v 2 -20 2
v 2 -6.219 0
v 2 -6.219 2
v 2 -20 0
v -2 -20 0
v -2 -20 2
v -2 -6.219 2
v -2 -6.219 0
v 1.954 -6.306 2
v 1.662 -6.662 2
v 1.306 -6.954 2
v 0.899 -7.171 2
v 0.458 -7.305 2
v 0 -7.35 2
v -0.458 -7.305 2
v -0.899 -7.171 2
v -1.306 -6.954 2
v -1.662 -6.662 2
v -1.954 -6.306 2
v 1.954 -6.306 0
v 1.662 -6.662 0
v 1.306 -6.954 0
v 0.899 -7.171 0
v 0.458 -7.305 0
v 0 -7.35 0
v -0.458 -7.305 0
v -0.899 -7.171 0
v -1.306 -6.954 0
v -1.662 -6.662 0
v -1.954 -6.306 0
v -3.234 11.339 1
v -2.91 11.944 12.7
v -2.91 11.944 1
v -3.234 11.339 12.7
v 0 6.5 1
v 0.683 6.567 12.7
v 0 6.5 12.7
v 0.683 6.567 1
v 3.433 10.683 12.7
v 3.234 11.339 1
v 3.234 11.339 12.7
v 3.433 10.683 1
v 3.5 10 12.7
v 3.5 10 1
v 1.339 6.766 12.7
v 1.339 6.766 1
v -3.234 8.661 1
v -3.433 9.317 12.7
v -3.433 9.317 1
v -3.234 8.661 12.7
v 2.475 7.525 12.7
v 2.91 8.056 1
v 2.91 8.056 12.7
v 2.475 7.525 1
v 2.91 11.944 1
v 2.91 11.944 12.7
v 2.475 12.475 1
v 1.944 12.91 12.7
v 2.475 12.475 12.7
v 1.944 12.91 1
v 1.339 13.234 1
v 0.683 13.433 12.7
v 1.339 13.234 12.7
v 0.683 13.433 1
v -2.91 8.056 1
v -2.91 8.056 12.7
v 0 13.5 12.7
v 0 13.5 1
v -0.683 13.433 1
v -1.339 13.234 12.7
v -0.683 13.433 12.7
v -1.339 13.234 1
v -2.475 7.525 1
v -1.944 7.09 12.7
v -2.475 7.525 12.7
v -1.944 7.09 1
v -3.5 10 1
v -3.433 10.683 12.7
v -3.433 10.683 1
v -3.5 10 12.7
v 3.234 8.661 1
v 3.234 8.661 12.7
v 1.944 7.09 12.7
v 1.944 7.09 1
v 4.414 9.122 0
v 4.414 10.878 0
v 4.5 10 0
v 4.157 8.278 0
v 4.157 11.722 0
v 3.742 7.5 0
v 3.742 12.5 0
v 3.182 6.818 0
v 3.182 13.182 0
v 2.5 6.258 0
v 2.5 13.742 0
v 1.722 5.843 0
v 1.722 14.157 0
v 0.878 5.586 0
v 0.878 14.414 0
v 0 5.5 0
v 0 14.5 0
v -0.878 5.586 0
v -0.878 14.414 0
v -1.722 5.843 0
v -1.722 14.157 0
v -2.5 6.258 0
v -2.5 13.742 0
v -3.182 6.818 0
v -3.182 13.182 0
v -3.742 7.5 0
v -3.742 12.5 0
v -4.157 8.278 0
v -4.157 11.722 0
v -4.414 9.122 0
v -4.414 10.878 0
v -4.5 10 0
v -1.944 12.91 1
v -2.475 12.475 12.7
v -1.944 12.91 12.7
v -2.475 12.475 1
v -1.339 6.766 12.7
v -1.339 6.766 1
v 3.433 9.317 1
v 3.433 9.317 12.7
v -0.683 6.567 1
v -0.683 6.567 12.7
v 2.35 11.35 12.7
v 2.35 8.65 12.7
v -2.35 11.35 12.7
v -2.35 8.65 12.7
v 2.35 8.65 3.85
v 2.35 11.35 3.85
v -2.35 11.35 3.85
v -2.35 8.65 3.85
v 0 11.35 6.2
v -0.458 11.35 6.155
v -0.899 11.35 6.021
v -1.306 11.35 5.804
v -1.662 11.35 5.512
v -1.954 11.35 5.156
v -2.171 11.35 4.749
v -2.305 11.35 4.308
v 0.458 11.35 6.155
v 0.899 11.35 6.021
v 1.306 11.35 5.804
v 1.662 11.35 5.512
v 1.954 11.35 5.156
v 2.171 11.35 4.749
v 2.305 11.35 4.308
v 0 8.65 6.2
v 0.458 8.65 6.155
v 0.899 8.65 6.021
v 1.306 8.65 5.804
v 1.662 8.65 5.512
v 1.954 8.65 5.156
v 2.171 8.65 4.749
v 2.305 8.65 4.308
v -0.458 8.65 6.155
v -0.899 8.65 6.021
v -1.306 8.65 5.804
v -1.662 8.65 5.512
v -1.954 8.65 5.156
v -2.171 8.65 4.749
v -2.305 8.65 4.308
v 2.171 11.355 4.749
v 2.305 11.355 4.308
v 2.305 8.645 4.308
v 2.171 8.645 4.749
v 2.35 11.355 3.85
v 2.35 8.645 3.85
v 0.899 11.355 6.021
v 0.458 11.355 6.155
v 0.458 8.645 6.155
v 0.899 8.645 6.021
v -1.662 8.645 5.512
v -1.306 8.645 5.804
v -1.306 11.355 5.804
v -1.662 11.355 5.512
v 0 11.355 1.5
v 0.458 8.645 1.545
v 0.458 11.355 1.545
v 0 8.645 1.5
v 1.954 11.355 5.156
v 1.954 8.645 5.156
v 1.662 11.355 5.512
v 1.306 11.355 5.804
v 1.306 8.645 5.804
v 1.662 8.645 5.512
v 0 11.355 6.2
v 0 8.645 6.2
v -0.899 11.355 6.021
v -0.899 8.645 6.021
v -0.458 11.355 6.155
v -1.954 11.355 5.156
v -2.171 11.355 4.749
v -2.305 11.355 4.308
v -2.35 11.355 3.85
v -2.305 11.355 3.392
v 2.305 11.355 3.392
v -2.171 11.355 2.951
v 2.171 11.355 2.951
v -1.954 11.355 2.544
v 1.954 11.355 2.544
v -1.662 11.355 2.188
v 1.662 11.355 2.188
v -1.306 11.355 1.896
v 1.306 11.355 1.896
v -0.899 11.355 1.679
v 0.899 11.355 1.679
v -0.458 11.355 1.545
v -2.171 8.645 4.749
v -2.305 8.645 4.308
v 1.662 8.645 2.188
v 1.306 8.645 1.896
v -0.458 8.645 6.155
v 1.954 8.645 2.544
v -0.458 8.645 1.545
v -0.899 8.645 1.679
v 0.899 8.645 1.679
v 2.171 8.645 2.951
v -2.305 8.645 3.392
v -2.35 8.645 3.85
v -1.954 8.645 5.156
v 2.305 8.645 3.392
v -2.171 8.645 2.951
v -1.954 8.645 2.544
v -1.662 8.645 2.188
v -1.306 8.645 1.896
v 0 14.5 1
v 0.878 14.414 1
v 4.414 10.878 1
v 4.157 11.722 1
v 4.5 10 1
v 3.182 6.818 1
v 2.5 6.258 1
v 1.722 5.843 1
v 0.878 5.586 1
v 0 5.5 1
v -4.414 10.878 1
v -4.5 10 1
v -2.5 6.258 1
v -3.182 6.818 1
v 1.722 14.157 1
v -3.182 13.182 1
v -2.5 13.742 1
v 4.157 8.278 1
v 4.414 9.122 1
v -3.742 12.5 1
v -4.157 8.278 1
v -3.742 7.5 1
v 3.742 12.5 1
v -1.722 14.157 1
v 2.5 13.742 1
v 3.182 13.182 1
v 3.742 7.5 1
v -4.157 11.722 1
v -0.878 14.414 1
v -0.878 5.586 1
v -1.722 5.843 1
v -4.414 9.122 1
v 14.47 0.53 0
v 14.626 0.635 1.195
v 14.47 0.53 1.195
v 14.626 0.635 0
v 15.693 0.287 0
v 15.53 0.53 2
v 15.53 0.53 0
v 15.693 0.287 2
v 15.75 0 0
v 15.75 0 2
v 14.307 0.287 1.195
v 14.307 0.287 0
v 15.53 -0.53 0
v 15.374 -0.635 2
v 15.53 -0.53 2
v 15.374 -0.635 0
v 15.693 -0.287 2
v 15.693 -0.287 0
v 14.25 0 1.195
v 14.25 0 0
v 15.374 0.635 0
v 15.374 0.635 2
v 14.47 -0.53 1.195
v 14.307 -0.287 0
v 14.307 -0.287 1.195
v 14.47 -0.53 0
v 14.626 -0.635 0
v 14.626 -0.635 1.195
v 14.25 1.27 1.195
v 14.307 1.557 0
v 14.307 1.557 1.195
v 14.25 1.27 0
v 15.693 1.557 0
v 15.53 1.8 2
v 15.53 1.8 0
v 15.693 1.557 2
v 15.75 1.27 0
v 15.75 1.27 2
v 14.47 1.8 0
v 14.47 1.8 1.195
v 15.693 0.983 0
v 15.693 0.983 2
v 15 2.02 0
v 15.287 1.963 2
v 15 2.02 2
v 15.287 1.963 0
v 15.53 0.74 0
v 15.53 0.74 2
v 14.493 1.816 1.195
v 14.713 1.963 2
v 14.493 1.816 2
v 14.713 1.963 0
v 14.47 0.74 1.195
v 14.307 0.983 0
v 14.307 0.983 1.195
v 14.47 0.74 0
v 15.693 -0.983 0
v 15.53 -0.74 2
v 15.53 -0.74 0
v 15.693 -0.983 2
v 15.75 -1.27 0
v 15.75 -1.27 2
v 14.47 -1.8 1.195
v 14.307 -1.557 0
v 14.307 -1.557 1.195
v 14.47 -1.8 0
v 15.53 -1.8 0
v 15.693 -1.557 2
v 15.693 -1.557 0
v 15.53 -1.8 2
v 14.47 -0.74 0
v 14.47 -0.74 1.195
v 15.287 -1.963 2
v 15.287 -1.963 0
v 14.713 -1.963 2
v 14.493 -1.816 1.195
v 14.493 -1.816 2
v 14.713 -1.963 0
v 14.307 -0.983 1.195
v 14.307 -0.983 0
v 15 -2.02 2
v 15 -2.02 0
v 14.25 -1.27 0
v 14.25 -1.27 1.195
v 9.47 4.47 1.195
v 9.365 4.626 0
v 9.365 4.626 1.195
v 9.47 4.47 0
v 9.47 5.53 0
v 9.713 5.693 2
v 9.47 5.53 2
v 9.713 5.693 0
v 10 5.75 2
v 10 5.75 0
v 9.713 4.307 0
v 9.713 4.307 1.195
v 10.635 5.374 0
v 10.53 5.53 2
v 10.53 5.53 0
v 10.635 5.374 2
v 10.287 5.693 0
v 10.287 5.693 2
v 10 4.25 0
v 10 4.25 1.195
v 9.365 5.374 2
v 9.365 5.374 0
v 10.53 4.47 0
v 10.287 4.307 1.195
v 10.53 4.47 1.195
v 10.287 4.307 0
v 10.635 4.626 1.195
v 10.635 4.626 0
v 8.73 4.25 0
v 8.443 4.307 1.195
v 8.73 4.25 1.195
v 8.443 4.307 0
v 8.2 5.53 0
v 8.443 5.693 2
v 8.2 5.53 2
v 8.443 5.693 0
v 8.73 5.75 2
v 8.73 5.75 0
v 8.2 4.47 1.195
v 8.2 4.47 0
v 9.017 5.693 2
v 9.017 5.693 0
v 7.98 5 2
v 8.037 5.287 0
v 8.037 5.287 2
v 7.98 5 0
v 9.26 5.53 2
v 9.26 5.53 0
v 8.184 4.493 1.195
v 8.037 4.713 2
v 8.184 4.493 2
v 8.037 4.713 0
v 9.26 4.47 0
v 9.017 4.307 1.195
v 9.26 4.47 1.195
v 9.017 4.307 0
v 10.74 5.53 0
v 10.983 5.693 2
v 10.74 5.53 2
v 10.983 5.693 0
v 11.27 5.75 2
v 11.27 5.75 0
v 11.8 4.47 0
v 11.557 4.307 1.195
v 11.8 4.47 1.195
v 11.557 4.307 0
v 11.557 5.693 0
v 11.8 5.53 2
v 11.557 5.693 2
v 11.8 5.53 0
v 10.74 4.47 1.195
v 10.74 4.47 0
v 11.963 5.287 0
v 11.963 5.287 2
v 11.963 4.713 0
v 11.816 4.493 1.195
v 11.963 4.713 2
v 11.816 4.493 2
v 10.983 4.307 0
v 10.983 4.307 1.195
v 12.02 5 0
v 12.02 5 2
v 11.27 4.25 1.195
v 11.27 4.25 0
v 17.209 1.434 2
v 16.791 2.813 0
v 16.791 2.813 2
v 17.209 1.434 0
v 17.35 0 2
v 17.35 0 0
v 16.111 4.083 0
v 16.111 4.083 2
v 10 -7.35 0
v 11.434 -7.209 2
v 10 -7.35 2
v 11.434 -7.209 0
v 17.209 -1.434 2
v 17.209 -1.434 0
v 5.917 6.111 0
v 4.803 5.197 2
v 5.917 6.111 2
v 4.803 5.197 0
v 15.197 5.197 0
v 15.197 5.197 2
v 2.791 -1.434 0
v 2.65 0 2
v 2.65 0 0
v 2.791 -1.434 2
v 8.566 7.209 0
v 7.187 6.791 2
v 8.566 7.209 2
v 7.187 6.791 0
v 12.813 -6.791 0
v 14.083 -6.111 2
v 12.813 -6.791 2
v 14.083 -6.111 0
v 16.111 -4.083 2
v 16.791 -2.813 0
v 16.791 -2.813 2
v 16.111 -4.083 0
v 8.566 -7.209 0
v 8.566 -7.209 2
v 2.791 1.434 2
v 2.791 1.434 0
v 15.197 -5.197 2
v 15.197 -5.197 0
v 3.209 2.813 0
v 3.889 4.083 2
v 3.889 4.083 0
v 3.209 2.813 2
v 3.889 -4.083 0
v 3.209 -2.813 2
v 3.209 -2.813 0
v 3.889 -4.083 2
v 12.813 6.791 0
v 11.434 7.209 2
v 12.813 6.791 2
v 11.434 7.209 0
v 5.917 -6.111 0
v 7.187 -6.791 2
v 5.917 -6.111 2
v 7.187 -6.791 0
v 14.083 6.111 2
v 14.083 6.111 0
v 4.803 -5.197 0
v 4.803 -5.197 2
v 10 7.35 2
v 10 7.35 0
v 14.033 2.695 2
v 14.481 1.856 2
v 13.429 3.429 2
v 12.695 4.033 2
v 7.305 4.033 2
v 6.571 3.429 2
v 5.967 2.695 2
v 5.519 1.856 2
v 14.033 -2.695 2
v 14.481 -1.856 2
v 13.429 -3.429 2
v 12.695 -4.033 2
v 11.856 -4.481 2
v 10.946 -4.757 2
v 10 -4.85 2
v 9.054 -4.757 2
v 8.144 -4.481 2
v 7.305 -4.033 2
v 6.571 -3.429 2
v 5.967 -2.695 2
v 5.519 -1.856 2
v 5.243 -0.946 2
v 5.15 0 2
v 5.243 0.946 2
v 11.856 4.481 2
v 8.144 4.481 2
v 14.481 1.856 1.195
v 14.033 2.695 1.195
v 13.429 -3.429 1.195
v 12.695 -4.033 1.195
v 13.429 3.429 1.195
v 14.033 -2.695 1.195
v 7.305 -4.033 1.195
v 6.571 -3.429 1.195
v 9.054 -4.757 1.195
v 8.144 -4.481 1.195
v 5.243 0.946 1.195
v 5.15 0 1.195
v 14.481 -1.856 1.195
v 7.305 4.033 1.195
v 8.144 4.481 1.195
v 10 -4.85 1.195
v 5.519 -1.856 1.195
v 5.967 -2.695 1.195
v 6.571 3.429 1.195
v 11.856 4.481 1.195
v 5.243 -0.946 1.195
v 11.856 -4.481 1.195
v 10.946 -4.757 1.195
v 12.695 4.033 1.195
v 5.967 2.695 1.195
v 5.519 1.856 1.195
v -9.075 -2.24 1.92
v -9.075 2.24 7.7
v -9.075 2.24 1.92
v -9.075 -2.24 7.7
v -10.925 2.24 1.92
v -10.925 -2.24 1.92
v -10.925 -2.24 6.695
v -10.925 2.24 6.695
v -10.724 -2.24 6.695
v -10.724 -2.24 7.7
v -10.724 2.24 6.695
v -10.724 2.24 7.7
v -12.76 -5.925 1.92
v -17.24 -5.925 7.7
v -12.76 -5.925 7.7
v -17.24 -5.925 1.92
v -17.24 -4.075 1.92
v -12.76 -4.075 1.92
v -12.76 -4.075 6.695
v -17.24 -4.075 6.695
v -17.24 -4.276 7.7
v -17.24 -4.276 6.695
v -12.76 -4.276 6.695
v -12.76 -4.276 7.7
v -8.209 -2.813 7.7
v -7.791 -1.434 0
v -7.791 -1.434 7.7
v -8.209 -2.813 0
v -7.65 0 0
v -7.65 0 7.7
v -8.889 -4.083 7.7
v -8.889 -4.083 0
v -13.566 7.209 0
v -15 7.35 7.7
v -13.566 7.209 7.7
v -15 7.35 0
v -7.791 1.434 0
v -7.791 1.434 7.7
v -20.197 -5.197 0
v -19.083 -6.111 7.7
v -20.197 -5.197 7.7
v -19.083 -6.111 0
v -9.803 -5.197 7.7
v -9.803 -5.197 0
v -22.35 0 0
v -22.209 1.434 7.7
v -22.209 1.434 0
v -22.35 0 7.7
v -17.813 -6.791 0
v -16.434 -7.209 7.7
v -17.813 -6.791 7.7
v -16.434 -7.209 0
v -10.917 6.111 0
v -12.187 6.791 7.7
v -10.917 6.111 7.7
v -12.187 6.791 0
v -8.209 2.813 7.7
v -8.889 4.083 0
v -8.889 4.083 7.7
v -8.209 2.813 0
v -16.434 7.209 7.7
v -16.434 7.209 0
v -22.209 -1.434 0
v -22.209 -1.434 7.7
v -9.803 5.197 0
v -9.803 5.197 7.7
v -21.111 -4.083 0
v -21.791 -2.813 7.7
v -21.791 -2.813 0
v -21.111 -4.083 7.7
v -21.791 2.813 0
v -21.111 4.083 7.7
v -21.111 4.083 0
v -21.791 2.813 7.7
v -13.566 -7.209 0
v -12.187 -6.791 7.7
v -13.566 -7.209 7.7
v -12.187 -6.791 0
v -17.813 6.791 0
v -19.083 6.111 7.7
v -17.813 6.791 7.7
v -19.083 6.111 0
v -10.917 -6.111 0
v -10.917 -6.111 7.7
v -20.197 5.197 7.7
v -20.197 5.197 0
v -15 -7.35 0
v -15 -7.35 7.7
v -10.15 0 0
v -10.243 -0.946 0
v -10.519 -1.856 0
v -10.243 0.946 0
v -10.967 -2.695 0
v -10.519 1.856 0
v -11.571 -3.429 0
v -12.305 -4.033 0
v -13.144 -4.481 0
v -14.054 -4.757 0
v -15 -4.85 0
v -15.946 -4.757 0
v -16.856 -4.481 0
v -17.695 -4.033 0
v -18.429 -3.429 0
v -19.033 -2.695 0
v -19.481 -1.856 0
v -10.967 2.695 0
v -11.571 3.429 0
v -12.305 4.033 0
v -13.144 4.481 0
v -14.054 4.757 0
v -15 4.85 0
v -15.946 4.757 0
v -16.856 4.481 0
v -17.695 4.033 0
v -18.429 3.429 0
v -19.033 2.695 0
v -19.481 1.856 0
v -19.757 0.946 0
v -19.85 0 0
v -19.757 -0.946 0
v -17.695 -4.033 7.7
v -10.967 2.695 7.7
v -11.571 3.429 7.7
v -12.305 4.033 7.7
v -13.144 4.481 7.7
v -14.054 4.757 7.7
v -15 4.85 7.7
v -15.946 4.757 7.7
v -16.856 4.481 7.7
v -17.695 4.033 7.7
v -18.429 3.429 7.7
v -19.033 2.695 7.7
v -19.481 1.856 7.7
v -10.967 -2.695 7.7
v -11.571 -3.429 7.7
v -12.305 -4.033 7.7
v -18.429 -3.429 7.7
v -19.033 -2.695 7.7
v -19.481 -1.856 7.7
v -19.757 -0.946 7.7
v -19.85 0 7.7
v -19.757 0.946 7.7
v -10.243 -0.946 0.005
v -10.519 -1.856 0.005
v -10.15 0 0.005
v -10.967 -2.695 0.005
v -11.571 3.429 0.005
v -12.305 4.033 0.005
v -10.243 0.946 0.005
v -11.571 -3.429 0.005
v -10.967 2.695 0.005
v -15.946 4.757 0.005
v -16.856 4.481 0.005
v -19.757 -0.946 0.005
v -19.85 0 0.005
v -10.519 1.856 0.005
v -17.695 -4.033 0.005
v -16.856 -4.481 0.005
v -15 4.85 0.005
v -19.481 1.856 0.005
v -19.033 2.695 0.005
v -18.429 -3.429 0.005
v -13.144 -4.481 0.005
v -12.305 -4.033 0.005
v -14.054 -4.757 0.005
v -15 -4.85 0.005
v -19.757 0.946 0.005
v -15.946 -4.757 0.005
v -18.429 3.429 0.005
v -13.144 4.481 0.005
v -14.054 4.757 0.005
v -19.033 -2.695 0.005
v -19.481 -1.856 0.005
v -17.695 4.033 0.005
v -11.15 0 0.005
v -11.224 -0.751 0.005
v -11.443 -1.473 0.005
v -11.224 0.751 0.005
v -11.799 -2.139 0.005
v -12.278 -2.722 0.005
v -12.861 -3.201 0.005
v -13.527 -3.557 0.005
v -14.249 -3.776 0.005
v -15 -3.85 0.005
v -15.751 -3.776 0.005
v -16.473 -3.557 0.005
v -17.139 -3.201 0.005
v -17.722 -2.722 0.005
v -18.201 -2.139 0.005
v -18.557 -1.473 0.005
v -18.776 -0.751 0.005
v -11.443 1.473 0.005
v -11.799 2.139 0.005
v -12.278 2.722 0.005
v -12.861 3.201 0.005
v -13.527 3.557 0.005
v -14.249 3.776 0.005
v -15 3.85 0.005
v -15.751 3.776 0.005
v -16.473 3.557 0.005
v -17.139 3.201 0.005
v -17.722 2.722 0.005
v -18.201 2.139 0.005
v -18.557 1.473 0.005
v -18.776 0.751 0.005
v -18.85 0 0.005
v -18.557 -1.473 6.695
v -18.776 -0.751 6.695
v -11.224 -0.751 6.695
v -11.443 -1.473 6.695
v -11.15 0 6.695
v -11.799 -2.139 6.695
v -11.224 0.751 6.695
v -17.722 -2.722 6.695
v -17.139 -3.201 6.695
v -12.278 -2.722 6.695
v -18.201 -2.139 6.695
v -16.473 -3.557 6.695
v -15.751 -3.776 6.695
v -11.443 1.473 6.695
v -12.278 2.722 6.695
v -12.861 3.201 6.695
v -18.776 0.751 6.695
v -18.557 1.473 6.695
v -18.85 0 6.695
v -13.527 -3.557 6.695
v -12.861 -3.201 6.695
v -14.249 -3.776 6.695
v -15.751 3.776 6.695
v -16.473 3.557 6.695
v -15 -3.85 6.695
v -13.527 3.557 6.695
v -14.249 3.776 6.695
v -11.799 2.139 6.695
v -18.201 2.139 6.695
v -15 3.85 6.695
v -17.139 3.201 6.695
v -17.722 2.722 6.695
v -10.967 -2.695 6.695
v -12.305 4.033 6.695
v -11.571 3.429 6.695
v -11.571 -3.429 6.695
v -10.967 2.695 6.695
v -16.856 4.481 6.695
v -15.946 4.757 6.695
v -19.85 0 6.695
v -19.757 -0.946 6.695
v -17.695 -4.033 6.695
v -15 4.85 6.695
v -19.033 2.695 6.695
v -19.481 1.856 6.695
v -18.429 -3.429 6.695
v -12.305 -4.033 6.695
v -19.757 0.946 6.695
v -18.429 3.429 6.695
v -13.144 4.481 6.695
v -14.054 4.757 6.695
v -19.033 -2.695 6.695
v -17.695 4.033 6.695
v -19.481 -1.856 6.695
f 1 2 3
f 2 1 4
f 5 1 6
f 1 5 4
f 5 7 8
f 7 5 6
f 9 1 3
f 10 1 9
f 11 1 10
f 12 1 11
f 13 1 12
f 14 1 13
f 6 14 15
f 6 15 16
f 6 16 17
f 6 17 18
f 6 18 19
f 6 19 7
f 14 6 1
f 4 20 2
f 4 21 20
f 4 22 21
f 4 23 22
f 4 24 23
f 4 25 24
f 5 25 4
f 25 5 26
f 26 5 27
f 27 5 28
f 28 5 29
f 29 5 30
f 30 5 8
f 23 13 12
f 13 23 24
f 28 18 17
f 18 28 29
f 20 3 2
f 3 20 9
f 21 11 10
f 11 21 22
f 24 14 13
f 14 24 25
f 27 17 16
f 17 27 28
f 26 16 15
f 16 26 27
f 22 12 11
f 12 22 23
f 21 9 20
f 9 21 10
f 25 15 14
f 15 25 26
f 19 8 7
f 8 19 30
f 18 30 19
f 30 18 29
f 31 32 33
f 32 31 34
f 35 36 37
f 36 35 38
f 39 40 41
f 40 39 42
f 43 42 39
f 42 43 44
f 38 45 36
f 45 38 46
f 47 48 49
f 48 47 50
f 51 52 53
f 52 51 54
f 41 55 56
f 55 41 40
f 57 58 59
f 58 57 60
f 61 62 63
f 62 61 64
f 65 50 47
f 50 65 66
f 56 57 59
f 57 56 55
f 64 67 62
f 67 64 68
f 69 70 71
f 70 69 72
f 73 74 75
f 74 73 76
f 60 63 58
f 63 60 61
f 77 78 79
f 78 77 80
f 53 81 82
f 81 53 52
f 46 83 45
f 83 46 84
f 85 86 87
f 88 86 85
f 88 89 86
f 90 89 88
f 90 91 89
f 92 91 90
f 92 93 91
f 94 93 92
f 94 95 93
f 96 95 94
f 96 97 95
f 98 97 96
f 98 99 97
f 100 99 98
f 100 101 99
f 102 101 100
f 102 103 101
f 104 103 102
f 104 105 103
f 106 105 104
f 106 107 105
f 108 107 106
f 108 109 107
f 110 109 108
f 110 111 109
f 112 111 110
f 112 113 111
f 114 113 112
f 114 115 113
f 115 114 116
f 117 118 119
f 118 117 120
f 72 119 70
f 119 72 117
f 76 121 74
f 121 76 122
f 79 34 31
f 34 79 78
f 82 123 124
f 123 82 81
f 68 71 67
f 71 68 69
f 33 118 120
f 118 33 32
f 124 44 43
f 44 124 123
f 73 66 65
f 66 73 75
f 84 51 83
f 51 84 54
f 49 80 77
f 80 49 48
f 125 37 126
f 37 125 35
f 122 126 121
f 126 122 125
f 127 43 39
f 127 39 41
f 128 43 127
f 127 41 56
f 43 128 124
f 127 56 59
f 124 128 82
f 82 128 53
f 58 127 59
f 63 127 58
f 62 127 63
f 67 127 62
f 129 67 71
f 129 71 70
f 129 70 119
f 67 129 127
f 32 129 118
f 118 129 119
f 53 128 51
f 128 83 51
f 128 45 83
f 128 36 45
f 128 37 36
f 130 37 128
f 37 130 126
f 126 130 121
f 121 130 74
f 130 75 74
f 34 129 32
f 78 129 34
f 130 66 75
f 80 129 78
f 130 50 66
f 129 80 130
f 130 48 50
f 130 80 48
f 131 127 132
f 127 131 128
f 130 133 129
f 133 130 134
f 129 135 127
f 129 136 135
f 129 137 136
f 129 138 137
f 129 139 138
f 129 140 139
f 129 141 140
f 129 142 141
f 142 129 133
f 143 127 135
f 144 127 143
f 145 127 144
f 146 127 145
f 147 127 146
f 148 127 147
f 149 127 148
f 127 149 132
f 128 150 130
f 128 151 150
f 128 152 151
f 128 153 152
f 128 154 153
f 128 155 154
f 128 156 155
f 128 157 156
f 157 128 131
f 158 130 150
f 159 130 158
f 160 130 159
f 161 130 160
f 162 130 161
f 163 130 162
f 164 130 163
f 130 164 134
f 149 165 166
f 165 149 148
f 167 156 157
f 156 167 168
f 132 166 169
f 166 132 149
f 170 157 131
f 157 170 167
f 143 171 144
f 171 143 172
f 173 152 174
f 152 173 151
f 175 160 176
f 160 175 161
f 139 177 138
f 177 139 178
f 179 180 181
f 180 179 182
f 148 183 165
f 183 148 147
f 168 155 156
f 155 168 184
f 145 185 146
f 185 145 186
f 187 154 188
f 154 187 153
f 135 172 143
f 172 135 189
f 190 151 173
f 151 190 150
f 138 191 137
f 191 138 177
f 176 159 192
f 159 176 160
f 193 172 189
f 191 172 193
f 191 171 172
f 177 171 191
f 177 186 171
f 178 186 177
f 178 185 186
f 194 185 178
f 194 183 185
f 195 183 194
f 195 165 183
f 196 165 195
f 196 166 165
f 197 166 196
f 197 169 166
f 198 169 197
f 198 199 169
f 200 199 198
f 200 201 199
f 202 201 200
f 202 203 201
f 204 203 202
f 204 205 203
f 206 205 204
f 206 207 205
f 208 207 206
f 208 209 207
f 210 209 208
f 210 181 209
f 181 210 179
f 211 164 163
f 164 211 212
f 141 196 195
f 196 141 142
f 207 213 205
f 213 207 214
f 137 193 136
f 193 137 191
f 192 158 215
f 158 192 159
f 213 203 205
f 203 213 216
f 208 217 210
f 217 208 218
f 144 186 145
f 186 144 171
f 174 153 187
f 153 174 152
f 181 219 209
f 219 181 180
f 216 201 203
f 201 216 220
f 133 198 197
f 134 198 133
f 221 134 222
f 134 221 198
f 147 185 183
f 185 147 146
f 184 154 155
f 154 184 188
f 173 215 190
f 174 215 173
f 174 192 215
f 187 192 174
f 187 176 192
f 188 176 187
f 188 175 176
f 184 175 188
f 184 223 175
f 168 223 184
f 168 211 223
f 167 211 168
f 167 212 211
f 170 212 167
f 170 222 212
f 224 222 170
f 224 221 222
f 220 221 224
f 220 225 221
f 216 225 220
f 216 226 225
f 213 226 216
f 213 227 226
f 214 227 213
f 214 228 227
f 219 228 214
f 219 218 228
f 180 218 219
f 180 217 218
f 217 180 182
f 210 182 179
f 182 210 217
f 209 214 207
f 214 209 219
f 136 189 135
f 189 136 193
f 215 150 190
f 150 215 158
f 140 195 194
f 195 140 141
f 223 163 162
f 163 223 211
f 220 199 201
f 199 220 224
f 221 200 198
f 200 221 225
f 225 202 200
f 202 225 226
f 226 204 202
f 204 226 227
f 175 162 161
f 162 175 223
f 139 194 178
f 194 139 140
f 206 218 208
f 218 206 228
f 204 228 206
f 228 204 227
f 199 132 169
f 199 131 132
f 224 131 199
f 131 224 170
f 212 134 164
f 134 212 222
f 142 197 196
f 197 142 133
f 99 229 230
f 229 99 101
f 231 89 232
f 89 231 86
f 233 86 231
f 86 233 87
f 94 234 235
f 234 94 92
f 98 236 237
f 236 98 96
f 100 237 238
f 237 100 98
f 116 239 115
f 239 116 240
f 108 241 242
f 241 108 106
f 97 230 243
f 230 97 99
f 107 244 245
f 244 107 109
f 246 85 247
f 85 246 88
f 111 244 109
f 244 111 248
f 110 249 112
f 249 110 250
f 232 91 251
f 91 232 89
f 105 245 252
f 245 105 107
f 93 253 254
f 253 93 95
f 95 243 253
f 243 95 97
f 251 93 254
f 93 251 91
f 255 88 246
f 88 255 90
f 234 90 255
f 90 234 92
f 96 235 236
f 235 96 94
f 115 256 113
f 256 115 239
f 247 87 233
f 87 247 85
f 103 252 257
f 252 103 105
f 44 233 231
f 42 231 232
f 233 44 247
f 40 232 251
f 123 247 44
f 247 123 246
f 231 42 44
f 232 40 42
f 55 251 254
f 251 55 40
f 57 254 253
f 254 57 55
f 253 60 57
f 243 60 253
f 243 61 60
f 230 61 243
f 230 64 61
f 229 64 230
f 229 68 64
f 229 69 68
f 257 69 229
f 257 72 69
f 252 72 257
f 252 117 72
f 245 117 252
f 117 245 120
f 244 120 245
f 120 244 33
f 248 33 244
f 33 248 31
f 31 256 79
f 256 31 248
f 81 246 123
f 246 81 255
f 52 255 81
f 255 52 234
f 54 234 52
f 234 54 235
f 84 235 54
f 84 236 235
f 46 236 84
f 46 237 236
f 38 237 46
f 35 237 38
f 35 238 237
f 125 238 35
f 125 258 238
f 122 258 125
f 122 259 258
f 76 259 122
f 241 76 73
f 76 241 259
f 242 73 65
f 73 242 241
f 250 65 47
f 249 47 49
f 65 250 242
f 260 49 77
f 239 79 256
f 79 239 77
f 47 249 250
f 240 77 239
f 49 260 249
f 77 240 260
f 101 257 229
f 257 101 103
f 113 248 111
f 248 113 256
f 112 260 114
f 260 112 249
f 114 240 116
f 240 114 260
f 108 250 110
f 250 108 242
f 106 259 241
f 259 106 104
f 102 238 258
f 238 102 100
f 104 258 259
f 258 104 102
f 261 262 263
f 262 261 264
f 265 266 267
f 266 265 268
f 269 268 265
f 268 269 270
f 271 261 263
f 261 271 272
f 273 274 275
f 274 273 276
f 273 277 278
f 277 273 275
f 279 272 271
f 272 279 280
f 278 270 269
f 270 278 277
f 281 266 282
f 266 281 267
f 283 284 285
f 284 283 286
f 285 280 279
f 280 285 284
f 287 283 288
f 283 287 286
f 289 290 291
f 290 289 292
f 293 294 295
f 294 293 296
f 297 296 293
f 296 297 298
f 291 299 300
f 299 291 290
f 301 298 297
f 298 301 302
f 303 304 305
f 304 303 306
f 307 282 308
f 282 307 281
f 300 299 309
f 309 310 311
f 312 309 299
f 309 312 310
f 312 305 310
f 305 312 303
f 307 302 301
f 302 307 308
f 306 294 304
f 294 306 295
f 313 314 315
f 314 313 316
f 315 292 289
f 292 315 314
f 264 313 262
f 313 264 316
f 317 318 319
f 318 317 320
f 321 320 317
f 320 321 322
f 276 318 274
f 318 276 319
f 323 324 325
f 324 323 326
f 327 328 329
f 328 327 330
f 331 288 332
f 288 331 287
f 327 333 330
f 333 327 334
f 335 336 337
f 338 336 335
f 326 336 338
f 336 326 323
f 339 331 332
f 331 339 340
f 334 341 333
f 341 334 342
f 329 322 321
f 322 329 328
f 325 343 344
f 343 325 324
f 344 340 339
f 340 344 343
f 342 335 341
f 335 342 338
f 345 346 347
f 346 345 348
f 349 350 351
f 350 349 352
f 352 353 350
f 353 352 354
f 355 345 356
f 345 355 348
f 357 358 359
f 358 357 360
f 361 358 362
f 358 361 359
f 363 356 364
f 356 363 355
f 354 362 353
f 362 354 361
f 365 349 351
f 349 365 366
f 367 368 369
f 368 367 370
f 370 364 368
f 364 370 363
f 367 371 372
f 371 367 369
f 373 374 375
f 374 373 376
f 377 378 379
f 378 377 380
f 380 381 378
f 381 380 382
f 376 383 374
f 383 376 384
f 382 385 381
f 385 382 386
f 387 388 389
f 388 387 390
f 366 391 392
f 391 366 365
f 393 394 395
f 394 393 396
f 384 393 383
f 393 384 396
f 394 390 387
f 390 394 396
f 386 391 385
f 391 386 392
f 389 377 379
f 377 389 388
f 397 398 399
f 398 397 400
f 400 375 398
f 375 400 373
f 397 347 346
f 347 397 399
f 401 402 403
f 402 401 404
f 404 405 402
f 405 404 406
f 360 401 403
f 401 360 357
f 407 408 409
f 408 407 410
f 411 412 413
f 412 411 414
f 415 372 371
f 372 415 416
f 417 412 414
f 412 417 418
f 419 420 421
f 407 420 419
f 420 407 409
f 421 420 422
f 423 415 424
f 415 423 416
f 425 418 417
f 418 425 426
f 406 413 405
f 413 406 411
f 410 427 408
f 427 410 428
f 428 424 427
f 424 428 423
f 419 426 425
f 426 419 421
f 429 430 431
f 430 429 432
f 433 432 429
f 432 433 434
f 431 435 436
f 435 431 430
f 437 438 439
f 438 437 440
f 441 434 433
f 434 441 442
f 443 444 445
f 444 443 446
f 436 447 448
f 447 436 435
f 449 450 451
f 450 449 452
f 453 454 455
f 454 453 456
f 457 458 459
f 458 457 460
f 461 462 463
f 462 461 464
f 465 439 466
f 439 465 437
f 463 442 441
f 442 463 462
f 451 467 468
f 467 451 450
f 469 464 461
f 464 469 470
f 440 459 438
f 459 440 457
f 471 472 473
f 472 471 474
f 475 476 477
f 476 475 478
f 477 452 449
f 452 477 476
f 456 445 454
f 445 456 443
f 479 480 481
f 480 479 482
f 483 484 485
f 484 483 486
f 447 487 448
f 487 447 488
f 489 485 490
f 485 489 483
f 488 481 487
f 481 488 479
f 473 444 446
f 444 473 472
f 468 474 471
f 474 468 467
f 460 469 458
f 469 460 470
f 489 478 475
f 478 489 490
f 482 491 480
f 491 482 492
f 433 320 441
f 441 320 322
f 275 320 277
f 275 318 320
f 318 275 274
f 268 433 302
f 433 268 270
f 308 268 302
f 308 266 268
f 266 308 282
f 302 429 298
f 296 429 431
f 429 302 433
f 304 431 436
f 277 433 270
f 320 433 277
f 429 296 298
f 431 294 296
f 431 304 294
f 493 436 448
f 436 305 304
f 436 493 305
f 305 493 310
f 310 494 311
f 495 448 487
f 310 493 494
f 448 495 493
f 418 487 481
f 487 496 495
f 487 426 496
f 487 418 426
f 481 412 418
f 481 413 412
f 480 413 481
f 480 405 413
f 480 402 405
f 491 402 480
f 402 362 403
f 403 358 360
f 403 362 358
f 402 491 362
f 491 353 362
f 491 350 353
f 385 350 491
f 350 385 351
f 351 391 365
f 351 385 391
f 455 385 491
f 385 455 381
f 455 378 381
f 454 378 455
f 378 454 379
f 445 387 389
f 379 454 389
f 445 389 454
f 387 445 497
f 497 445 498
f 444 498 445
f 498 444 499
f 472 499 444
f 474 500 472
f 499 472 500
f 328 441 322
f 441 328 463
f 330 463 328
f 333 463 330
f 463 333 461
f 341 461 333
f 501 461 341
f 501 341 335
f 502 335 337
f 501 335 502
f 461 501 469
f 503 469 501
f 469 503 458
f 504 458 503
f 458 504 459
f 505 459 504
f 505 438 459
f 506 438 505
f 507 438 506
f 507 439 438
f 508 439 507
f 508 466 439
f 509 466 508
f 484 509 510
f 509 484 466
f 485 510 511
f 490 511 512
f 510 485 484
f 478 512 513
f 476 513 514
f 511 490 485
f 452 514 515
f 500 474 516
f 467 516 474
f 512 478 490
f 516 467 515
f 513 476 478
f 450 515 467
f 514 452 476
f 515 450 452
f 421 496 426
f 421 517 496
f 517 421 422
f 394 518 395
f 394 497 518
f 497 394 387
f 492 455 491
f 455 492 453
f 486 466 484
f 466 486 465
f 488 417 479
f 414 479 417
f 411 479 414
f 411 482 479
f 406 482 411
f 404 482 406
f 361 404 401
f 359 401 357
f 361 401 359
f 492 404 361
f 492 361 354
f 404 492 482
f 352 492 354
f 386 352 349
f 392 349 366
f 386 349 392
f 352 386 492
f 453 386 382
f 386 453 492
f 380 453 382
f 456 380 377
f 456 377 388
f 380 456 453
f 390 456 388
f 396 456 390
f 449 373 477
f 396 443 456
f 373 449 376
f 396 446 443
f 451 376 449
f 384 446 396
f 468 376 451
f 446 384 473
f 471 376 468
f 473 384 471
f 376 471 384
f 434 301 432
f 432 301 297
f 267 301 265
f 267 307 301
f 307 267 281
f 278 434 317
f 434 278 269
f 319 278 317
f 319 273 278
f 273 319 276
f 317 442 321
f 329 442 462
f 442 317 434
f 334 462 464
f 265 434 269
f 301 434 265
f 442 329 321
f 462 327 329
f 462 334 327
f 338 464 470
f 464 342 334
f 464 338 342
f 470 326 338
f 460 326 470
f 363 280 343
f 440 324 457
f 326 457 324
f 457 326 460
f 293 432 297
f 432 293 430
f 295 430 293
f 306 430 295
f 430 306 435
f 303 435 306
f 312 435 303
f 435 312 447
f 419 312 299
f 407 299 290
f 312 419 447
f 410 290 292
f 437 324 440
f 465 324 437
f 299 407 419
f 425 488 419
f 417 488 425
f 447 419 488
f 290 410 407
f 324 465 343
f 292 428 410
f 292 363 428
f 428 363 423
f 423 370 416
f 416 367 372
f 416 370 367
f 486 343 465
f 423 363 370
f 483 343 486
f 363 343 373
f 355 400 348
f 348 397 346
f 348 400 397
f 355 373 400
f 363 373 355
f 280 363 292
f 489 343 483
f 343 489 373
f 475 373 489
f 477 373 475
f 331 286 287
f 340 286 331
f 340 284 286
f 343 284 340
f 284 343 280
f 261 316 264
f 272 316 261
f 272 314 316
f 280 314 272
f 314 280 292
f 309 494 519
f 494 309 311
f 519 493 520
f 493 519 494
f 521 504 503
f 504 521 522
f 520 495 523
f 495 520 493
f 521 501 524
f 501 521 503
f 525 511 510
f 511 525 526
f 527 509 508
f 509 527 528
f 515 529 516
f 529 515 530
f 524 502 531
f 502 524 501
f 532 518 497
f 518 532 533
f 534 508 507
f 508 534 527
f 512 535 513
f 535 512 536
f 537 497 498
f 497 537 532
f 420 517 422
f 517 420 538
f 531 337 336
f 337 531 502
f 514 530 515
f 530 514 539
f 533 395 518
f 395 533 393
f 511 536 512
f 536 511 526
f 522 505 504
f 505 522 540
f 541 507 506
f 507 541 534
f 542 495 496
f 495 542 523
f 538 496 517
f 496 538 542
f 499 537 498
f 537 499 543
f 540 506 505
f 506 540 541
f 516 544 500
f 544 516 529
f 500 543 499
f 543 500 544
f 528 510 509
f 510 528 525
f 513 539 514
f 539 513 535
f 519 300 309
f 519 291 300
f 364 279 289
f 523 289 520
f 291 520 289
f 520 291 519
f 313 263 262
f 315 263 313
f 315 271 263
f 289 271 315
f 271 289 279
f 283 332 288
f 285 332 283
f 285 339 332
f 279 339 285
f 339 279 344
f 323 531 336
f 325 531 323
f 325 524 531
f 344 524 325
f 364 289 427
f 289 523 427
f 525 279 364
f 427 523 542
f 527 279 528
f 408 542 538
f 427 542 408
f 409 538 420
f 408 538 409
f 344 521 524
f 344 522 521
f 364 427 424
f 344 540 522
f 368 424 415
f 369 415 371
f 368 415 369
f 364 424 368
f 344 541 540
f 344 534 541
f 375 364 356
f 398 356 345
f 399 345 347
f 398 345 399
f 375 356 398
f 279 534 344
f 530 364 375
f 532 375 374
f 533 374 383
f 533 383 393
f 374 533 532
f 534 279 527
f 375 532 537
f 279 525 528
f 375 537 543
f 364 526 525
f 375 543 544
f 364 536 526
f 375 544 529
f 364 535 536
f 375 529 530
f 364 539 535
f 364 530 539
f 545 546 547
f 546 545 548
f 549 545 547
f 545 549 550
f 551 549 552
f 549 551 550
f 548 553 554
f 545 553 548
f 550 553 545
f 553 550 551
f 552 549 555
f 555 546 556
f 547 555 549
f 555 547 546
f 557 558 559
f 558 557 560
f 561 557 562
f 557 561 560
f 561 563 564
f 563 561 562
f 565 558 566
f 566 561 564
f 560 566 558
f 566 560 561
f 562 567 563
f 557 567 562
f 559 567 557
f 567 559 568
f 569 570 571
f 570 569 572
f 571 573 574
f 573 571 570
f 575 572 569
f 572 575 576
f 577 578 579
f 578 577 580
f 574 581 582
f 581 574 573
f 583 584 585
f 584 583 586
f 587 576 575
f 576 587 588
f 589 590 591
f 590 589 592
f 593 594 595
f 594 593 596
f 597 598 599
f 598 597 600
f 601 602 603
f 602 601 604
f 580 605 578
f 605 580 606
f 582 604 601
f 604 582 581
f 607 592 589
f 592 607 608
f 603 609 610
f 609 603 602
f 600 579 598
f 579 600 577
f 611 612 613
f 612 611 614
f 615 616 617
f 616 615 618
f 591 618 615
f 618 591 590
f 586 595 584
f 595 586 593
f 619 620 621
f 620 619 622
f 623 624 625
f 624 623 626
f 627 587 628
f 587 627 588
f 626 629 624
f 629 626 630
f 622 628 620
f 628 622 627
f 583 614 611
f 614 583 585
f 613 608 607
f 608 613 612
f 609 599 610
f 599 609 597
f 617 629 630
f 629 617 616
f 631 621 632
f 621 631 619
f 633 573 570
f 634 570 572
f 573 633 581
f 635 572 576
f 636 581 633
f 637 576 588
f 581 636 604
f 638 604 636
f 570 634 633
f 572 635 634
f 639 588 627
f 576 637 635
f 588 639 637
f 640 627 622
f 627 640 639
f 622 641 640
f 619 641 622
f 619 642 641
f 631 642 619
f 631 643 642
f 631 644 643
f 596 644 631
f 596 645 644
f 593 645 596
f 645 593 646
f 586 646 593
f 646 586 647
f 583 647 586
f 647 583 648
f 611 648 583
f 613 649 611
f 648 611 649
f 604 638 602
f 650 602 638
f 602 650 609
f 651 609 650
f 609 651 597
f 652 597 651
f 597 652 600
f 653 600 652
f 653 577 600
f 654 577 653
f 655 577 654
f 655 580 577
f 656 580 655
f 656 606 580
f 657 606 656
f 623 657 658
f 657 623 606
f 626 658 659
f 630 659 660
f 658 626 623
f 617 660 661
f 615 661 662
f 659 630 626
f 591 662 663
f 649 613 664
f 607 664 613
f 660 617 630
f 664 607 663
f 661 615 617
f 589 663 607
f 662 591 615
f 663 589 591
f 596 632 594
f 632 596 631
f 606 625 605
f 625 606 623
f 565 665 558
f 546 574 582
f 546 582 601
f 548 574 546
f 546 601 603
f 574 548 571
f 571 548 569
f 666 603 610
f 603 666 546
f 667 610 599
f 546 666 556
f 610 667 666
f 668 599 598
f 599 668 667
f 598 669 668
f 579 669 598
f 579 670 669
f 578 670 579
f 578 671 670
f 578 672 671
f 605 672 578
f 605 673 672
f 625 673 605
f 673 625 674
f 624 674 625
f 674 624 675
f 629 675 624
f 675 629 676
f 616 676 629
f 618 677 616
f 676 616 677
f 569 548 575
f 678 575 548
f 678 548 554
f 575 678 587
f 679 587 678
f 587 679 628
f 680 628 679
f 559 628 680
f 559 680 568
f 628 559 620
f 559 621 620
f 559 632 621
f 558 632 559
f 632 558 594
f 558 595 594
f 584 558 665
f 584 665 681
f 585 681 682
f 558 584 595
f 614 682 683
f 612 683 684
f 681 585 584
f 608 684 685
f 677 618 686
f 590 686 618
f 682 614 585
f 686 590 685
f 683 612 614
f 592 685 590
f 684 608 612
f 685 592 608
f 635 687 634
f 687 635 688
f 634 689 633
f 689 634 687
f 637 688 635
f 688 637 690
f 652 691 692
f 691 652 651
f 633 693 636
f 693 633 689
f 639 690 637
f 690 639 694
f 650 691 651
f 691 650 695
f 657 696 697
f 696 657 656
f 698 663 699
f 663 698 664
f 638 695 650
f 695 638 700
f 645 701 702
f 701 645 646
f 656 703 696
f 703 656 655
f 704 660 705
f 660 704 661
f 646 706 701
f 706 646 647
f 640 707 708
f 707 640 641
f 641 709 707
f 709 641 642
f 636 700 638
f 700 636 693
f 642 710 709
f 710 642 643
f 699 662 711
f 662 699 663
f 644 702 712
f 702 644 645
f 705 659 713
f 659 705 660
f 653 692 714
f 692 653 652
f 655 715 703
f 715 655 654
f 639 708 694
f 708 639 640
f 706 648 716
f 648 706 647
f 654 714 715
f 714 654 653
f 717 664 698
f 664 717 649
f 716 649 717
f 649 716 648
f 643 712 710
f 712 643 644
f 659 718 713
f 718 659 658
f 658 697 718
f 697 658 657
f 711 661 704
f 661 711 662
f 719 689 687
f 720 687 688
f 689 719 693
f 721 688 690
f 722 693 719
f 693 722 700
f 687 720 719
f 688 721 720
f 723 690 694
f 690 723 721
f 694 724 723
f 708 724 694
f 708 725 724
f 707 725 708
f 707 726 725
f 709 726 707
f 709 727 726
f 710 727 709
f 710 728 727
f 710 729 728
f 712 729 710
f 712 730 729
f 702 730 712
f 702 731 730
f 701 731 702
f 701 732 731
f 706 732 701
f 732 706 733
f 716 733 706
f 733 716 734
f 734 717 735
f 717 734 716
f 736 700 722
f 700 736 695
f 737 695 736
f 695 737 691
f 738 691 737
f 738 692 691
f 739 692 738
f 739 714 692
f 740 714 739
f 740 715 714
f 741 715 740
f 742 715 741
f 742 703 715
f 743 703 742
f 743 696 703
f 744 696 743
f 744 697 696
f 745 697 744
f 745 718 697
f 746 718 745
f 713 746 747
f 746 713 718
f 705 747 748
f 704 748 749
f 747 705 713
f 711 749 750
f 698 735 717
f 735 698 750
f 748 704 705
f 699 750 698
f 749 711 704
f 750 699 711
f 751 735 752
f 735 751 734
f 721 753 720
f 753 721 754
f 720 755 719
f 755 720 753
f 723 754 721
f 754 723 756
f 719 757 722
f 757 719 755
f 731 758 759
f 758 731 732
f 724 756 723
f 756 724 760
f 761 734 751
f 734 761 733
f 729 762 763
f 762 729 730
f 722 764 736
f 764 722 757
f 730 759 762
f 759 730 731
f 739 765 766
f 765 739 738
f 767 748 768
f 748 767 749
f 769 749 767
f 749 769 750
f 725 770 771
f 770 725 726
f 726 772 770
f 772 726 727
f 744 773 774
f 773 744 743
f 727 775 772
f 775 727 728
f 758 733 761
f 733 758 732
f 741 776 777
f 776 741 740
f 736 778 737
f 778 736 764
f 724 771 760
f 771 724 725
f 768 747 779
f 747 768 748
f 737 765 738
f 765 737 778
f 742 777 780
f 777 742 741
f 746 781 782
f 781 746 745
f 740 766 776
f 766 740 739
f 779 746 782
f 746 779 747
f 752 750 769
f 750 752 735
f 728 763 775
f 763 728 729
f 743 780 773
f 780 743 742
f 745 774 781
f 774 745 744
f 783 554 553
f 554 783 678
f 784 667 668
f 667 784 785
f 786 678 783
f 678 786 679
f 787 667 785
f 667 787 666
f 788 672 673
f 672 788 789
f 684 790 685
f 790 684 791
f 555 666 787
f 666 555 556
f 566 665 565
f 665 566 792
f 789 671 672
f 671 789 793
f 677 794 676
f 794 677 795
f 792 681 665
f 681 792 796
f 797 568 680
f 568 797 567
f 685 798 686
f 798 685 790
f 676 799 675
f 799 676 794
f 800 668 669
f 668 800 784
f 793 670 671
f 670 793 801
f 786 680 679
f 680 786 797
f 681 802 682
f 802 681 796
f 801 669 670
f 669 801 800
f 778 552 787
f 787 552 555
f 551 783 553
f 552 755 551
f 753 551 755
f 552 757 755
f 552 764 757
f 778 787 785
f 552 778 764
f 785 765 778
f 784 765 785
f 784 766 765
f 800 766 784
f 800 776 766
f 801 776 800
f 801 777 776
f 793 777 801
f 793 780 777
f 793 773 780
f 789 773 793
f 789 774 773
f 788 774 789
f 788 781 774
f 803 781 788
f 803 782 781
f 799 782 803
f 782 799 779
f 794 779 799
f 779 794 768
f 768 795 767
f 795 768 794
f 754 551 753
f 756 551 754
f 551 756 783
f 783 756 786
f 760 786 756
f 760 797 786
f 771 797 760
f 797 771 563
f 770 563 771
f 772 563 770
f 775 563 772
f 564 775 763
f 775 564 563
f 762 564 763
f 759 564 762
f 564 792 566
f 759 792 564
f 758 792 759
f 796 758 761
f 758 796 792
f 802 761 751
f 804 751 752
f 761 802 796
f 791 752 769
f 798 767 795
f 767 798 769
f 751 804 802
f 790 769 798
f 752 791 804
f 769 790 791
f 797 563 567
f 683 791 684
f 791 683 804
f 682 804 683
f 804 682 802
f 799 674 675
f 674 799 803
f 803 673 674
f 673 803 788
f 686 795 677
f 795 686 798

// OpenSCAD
mgh=2;
mgd=4;
delta=0.7;
hndl=15;

module handle(differ=false) {
   if (differ)
        difference() {
            translate([0,0,hndl/2])
                cube([mgd, mgh, hndl], center=true);
            rotate([90,0,0])
                cylinder(d=mgd+delta, h=mgh+0.01, center=true, $fn=32);
        }
    else
        union() {
            translate([0,0,hndl/2])
                cube([mgd+delta, mgh+delta, hndl], center=true);
            rotate([90,0,0])
                cylinder(d=mgd+delta, h=mgh+delta+0.01, center=true, $fn=32);
        };
    
}

module rotor() {
    difference() {
        union() {
            cylinder(d=mgd+3, h=mgd+delta+3, center=true, $fn=32);
            translate([0,0,(mgd+delta+3+5)/2])
                cylinder(d=mgd+3, h=5, center=true, $fn=32);
        }
        handle();
    }
    translate([0,0,-(mgd+delta+3-1)/2])
        cylinder(d=mgd+5, h=1, center=true, $fn=32);
}

module top() {
    difference() {
        translate([0,0,(mgd+delta+3+1)/2])
            cylinder(d=mgd+5, h=1, center=true, $fn=32);
        handle();
    }

}

module stator() {
    difference() {
        translate([0,0,0])
            cylinder(d=mgd+delta+10, h=mgd+delta+3, center=true, $fn=32);
        translate([0,0,(mgd+delta+3+1)/2])
            cylinder(d=mgd+delta+5, h=1+0.01, center=true, $fn=32);
        cylinder(d=mgd+delta+3, h=mgd+delta+3+0.01, center=true, $fn=32);
        translate([0,0,-(mgd+delta+3-1)/2])
            cylinder(d=mgd+delta+5, h=1+0.01, center=true, $fn=32);
        translate([5,0,0]) {
            cube([1.55+delta-0.4, 4.08+delta-0.3, 3.16+delta], center=true);
            translate([0,0,-2.5])
                cube([1.55+delta-0.4, 4.08+delta-0.3, 5], center=true);
        }
        rotate([0,0,90])
        translate([5,0,0]) {
            cube([1.55+delta-0.4, 4.08+delta-0.3, 3.16+delta], center=true);
            translate([0,0,-2.5])
                cube([1.55+delta-0.4, 4.08+delta-0.3, 5], center=true);
        }

    }

}

module bottom() {
    difference() {
        translate([0,0,(mgd+delta+3+2)/2])
            cylinder(d=mgd+delta+10, h=2, center=true, $fn=32);

        translate([0,0,(mgd+delta+3+1+2.2)/2])
            cylinder(d=mgd+delta+5, h=0.8+0.01, center=true, $fn=32);

        translate([5,0,5]) {
            translate([0,0,0])
                cylinder(d=1.5, h=10, center=true, $fn=16);
            translate([0,1.27,0])
                cylinder(d=1.5, h=10, center=true, $fn=16);
            translate([0,-1.27,0])
                cylinder(d=1.5, h=10, center=true, $fn=16);
        }

        rotate([0,0,90])
        translate([5,0,5]) {
            translate([0,0,0])
                cylinder(d=1.5, h=10, center=true, $fn=16);
            translate([0,1.27,0])
                cylinder(d=1.5, h=10, center=true, $fn=16);
            translate([0,-1.27,0])
                cylinder(d=1.5, h=10, center=true, $fn=16);
        }

    }

}


translate([0,-5,1])
rotate([90,0,0])
handle(true);

translate([0,10,3.85])
rotor();

//translate([0,0,-3.7])
//top();

translate([10,0,-3.85])
bottom();

translate([-15,0,3.85])
rotate([180,0,0])
stator();
